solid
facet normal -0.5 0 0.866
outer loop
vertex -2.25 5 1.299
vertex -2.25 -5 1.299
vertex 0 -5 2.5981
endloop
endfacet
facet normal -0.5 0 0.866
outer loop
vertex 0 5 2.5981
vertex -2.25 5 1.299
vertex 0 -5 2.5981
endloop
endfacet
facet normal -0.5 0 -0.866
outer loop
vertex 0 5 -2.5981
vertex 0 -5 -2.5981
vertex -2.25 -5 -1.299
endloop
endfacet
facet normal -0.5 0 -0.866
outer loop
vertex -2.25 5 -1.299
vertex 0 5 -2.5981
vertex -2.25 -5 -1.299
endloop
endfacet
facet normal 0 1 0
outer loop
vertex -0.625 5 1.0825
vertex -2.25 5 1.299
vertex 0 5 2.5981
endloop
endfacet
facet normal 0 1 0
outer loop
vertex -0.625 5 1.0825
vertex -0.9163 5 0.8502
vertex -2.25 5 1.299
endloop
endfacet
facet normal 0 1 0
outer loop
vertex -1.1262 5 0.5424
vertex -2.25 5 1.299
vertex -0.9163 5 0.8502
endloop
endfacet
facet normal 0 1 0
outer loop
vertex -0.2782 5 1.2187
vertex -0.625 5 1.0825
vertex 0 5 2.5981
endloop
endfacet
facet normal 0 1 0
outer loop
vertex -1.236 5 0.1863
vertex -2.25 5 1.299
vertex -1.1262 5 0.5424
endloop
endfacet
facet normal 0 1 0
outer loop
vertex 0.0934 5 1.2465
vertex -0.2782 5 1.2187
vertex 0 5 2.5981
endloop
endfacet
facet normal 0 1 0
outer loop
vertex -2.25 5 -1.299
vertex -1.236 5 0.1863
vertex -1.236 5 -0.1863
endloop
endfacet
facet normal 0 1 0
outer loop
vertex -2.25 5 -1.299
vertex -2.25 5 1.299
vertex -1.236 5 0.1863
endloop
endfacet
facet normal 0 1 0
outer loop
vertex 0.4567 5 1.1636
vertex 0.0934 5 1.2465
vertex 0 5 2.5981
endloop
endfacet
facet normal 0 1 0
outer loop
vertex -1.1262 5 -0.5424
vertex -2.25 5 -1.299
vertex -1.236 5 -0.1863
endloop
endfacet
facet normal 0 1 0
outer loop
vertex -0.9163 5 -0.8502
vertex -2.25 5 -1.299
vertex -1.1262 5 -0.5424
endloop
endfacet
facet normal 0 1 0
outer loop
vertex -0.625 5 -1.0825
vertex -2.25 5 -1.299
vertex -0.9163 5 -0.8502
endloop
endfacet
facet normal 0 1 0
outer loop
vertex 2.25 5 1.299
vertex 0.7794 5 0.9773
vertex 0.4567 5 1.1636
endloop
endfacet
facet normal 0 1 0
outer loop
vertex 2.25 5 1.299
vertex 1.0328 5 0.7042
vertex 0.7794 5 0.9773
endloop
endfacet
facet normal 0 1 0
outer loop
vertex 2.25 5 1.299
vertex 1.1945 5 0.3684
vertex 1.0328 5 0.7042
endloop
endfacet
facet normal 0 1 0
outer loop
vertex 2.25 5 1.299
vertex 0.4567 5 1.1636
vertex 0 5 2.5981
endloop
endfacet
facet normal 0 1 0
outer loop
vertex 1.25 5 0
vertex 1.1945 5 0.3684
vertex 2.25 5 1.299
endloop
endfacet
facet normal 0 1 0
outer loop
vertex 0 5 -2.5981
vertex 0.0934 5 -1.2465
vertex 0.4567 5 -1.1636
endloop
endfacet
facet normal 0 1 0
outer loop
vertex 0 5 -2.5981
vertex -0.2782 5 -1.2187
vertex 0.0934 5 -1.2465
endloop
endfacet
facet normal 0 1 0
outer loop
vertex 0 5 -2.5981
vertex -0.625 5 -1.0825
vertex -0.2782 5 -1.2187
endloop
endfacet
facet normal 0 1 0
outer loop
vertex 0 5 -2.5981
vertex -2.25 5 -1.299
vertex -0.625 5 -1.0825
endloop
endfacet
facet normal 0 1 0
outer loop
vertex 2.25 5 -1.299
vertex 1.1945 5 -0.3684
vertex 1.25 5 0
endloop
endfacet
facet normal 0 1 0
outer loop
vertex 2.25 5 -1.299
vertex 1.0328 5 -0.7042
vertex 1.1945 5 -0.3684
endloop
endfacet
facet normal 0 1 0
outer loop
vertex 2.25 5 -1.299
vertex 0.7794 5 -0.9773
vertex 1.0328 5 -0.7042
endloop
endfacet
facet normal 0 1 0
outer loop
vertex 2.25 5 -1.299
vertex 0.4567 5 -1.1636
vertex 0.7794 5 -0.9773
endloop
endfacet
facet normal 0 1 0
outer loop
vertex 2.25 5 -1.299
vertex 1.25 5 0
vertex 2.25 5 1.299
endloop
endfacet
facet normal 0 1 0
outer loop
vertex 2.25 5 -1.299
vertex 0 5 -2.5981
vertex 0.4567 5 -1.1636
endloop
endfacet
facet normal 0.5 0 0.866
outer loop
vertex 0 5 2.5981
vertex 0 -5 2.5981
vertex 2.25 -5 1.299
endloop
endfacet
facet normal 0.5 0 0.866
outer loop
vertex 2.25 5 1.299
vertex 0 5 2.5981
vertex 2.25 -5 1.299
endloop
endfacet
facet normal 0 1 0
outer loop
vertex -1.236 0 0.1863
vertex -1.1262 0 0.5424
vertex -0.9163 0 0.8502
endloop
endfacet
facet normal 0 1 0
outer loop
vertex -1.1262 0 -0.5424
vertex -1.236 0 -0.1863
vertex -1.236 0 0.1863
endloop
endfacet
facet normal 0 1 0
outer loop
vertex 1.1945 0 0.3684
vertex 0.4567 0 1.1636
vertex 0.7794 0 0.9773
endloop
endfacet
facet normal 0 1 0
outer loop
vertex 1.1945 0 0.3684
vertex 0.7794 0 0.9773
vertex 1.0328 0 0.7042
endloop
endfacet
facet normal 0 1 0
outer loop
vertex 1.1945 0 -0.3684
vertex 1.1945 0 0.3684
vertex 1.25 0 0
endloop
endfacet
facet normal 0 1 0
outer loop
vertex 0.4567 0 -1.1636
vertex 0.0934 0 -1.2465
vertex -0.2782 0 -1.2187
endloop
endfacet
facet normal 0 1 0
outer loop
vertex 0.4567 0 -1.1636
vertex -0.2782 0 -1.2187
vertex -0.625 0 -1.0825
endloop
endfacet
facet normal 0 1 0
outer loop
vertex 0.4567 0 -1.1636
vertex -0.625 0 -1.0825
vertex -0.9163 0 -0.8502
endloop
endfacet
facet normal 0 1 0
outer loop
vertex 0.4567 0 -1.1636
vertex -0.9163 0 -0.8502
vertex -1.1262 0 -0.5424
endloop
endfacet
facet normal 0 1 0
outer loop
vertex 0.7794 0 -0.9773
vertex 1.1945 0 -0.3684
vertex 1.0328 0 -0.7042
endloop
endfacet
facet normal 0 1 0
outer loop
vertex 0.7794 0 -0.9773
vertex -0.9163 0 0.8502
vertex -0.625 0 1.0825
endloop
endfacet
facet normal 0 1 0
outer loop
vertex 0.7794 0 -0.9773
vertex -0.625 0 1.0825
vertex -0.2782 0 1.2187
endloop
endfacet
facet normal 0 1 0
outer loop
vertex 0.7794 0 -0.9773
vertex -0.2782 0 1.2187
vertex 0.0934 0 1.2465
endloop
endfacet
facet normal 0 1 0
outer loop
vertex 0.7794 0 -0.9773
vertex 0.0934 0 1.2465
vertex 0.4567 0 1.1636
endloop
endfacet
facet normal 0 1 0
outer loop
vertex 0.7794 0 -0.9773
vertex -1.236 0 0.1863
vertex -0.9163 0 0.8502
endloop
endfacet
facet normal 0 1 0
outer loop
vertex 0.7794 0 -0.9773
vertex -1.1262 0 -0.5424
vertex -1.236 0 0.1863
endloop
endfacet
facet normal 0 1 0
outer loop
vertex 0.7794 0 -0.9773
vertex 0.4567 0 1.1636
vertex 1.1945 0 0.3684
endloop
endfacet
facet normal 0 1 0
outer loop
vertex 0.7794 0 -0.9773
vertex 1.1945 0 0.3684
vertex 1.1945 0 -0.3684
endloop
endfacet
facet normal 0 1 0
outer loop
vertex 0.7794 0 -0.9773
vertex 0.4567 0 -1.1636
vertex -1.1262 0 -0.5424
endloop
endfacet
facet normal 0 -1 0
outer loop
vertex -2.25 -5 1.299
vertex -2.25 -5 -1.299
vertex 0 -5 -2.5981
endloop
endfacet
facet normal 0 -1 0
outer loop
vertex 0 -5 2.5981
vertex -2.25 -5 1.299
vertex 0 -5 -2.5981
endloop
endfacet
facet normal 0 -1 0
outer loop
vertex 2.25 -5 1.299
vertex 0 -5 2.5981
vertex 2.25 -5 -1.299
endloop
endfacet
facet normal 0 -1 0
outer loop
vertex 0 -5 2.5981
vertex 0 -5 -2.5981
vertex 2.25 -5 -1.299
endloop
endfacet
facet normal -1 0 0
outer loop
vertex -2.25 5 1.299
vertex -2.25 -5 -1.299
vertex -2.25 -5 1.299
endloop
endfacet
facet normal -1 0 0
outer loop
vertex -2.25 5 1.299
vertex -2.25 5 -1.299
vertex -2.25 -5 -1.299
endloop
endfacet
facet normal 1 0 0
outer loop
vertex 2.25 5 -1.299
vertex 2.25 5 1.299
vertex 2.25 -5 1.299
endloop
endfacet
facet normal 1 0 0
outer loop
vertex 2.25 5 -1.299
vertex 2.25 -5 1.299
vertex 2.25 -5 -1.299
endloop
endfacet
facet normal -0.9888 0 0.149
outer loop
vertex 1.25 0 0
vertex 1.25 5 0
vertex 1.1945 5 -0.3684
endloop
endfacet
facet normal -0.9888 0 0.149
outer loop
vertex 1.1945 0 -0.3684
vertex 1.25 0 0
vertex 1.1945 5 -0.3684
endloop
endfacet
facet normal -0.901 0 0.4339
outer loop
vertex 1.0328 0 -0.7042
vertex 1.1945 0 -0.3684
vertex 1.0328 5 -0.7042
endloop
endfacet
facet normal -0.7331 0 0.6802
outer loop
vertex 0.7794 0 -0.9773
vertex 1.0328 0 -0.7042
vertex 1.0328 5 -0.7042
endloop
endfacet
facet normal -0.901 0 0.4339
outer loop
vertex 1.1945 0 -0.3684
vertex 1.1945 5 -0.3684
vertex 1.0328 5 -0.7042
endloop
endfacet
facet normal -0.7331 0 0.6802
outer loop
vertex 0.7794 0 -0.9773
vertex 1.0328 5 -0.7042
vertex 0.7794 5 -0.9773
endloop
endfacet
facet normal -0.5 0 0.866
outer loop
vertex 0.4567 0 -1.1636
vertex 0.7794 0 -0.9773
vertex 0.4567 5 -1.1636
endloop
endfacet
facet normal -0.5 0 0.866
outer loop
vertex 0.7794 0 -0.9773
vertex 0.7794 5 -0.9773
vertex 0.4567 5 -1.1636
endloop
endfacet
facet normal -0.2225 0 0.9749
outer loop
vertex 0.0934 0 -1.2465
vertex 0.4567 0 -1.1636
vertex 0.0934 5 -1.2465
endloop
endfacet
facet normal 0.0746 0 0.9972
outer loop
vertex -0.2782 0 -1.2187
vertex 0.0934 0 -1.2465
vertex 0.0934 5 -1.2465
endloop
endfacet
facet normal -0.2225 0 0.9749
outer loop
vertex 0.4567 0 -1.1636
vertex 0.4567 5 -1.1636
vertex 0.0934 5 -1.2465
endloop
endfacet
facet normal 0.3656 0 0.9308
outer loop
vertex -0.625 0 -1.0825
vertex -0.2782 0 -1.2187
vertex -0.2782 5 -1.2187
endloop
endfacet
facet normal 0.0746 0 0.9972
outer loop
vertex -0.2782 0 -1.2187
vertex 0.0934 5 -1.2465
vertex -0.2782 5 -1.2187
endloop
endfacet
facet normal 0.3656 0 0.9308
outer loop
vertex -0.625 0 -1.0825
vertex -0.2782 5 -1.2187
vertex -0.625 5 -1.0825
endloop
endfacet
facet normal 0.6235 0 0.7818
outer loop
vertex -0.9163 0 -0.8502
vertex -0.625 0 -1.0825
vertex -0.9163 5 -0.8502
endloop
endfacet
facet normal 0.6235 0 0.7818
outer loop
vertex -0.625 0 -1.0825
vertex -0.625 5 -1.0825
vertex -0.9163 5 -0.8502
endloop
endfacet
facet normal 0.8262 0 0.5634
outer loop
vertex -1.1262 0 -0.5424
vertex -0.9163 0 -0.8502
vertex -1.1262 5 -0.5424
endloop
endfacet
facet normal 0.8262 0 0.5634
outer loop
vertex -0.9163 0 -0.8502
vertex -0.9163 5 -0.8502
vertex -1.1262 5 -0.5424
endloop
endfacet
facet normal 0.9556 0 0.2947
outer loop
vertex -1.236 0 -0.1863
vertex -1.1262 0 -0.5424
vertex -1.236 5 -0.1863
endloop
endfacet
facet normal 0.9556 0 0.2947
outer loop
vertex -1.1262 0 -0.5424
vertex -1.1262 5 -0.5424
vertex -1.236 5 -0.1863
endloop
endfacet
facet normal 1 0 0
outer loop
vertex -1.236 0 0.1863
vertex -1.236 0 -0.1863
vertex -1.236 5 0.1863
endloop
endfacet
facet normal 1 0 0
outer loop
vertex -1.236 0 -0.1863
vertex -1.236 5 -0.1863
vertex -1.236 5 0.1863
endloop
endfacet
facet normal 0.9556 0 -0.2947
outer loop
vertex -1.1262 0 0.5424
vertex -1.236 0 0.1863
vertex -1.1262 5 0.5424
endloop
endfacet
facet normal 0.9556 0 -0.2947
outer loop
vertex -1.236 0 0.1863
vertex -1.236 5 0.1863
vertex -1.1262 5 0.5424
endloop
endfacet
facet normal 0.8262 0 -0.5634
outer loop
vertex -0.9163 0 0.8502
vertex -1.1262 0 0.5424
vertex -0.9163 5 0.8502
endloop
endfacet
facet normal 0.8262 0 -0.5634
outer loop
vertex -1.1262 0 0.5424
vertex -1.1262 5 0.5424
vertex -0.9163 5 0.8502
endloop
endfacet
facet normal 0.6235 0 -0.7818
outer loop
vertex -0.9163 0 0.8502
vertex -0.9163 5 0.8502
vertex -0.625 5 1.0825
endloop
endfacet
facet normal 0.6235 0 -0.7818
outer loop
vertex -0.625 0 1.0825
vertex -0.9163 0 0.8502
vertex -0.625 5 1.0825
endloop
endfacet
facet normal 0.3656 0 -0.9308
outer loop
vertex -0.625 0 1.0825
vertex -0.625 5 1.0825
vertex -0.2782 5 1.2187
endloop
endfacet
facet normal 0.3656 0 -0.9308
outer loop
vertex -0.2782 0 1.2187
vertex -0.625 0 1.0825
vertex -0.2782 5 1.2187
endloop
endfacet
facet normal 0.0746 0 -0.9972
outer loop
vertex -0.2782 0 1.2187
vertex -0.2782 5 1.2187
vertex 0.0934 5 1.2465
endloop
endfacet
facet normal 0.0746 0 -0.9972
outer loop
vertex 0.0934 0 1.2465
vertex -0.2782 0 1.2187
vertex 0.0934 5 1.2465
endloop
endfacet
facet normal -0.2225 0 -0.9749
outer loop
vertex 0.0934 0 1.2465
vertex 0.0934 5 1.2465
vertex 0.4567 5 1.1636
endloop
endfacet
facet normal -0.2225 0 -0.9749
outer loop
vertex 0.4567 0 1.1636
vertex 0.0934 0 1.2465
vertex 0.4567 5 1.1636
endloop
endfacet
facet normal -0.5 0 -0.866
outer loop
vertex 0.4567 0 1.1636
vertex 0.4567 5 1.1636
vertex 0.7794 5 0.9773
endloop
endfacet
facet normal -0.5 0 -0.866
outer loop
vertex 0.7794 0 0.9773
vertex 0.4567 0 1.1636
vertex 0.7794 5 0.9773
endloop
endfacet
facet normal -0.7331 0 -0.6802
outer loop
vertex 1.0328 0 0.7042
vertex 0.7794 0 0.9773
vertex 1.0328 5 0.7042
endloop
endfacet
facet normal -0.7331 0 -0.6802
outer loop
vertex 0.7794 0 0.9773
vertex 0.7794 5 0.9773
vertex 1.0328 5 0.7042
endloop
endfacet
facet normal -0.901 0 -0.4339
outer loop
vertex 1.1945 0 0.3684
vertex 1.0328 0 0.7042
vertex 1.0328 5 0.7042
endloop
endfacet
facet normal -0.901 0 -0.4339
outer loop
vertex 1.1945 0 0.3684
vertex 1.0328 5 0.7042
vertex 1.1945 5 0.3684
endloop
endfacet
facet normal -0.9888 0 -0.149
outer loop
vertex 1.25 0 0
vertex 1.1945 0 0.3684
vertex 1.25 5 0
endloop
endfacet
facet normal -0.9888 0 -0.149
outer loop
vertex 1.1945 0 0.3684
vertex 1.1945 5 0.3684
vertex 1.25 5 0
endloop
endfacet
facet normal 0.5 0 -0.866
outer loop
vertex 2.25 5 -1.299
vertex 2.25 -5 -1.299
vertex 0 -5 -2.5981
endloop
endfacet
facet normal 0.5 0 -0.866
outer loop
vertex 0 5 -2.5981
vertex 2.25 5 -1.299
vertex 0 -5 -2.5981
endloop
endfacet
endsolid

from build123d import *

# Parameters (mm, degrees)
EXTRUDE_1_DEPTH     = 5
SKETCH_2_R          = 1.25
CUT_EXTRUDE_1_DEPTH = 5


with BuildPart() as part:
    # 草图1 → 凸台-拉伸1 (new body, symmetric)
    with BuildSketch(Plane(origin=(0, 0, 0), x_dir=(1, 0, 0), z_dir=(0, 1, 0))):
        Polygon((0, -2.598076211), (2.25, -1.299038106), (2.25, 1.299038106), (0, 2.598076211), (-2.25, 1.299038106), (-2.25, -1.299038106), align=None)
    extrude(amount=EXTRUDE_1_DEPTH, both=True)

    # 草图2 → 切除-拉伸1 (cut)
    with BuildSketch(Plane(origin=(0, 5, 0), x_dir=(1, 0, 0), z_dir=(0, 1, 0))):
        Circle(SKETCH_2_R)
    extrude(amount=-CUT_EXTRUDE_1_DEPTH, mode=Mode.SUBTRACT)


solid = part.part
